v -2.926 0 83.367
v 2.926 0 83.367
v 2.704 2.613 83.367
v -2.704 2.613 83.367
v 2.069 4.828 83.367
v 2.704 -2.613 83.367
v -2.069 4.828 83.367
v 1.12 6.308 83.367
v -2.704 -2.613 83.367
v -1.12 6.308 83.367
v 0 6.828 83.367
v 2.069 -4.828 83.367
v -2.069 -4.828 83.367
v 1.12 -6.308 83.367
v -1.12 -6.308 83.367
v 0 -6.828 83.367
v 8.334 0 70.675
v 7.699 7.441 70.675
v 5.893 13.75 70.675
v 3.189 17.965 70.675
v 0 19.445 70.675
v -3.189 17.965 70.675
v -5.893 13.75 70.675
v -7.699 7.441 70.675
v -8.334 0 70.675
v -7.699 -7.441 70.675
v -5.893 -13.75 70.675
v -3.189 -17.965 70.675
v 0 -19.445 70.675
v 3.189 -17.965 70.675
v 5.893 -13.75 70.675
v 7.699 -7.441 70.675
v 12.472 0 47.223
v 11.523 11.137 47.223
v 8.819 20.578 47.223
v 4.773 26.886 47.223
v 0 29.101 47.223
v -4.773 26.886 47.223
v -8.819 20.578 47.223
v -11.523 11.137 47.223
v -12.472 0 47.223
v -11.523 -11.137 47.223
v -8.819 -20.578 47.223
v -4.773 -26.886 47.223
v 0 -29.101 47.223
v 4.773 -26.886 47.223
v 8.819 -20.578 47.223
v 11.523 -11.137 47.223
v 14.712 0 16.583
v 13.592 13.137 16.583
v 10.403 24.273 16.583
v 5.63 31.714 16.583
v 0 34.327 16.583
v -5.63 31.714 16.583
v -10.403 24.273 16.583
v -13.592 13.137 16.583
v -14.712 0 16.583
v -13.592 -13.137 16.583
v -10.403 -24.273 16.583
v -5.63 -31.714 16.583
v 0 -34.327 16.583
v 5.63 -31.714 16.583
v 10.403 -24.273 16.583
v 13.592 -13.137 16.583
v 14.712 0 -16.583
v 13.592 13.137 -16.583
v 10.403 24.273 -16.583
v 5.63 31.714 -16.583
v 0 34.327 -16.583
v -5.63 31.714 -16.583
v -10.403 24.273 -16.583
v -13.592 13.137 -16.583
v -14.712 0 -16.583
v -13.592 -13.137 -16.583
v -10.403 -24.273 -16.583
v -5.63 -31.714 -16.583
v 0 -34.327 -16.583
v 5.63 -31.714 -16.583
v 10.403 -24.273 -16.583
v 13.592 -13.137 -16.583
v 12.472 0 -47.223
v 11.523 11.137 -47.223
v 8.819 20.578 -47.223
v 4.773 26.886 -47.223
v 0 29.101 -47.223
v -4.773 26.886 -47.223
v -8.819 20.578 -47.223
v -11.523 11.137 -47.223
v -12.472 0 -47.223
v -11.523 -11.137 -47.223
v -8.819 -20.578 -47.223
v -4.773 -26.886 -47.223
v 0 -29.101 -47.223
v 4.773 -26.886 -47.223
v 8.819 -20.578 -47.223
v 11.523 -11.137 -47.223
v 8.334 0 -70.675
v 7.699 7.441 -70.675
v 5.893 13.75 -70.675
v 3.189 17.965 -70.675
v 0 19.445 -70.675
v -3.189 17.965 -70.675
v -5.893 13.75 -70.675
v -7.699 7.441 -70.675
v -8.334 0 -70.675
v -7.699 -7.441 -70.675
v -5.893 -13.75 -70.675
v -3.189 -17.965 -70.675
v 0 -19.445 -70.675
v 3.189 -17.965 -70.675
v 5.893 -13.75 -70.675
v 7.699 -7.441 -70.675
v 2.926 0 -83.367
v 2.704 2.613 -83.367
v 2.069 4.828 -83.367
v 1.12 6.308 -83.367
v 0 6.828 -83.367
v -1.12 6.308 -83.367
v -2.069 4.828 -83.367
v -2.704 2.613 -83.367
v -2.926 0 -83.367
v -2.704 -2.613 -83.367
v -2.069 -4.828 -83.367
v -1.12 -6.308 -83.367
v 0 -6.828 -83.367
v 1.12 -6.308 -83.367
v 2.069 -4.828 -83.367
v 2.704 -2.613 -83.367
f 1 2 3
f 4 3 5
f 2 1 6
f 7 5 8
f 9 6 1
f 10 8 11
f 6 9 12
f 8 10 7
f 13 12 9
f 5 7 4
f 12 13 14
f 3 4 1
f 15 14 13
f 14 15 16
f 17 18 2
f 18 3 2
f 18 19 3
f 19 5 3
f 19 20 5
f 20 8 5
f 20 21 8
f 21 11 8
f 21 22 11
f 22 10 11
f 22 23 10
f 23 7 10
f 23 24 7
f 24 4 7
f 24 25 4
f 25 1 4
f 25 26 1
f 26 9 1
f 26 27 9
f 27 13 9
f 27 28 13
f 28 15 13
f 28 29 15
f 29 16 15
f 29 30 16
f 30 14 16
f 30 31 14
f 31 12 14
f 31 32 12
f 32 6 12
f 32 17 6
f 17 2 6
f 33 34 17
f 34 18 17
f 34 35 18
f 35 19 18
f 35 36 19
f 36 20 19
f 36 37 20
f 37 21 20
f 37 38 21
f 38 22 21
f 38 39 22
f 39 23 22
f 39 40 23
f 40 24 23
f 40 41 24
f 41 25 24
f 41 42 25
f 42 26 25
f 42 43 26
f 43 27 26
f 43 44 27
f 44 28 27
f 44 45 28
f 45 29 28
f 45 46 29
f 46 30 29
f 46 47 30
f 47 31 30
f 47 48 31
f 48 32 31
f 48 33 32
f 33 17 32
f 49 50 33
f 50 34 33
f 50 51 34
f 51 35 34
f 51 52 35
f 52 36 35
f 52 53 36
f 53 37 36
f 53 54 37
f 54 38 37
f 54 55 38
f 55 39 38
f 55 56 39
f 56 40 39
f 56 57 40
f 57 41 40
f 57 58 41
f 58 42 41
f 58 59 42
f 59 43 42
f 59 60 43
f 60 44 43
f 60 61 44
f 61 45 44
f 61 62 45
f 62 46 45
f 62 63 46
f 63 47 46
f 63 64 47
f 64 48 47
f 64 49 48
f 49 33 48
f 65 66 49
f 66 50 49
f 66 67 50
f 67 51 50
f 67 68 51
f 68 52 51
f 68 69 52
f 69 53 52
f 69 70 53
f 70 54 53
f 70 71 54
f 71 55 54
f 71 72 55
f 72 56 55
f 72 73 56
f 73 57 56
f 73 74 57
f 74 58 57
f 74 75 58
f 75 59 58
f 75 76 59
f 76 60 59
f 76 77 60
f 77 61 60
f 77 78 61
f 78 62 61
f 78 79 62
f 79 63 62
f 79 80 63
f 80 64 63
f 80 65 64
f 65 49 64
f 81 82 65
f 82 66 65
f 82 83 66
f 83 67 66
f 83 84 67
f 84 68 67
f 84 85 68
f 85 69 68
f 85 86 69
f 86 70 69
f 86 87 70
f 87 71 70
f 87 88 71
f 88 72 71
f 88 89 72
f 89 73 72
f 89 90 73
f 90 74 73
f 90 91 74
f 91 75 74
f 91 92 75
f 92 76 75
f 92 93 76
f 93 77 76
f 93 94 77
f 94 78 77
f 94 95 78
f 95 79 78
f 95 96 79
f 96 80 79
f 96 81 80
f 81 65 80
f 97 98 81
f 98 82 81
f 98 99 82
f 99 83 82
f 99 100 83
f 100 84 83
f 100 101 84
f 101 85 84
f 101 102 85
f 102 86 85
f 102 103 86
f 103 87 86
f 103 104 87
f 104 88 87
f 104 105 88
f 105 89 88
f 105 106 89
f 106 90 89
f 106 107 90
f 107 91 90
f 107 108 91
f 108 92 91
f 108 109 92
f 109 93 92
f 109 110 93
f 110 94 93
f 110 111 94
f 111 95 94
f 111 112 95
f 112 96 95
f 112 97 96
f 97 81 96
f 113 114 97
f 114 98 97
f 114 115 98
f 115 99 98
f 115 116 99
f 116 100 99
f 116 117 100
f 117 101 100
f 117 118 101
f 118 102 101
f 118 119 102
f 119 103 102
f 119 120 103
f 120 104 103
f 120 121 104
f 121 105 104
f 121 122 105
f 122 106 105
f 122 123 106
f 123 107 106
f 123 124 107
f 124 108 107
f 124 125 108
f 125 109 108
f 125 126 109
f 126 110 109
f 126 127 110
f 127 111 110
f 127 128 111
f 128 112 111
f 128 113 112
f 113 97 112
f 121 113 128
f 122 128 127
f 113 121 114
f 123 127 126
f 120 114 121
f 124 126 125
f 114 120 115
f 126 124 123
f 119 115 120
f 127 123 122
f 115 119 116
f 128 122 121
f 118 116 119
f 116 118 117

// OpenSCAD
// Generated by SolidPython 1.0.1 on 2020-07-29 00:46:45


scale(v = [3, 7, 17]) {
	sphere(r = 5);
}
/***********************************************
*********      SolidPython code:      **********
************************************************
 
# import packages: SolidPython
from solid import *
from solid.utils import *
from itertools import chain, combinations, permutations


class Resize:

    def __init__(self, scad_file):
        self.scad_file = scad_file
        #self.scad_file = import_scad(scad_file)
        # cone/cylinder param:
        self.r1 = 0
        self.r2 = 0
        self.h = 0
        # rectangular prism param:
        self.w = 0
        self.l = 0
        # ellipse param:
        self.r = 0

    # import OpenScad code (file name corresponds to shape)


    # classify shape + parameters
    def assign(self, param1, param2, param3):
        if self.scad_file == 'cone.scad':
            self.r1 = param1
            self.r2 = param2
            self.h = param3
        elif self.scad_file == 'cylinder.scad':
            self.r1 = param1
            self.r2 = param2
            self.h = param3
        elif self.scad_file == 'rectangularPrism.scad':
            self.h = param1
            self.l = param2
            self.w = param3
        else:
            self.r = param1
            self.h = param2

    # resize parameters
    def iterate(self):
        x = range(3, 20, 2)
        i = 1
        if self.scad_file == 'cone.scad':
            tempList = list(permutations(x, 2))
            for temp in tempList:
                param1 = temp[0]
                param2 = temp[1]
                filepath = 'produced_scad_files/' + 'cone' + str(param1) + '_' + str(param2) + '_' + '.scad'
                scad_render_to_file(cylinder(h=param1, r1=param2, r2=0), filepath)

        elif self.scad_file == 'cylinder.scad':
            tempList = list(permutations(x, 3))
            for temp in tempList:
                param1 = temp[0]
                param2 = temp[1]
                filepath = 'produced_scad_files/' + 'cylinder' + str(param1) + '_' + str(param2) + '_' + '.scad'
                scad_render_to_file(cylinder(h=param1, r1=param2, r2=param2), filepath)

        elif self.scad_file == 'rectangularPrism.scad':
            tempList = list(permutations(x, 3))
            for temp in tempList:
                param1 = temp[0]
                param2 = temp[1]
                param3 = temp[2]
                filepath = 'produced_scad_files/' + 'rectangularPrism' + str(param1) + '_' + str(param2) + '_' + str(
                    param3) + '.scad'
                scad_render_to_file(cube(size=(param1, param2, param3)), filepath)

        elif self.scad_file == 'ellipse.scad':
            tempList = list(permutations(x, 4))
            for temp in tempList:
                param1 = temp[0]
                param2 = temp[1]
                param3 = temp[2]
                param4 = temp[3]
                filepath = 'produced_scad_files/' + 'ellipse' + str(param1) + '_' + str(param2) + '_' + str(param3) + '_' + str(param4) + '.scad'
                scad_render_to_file(scale([param1, param2, param3])(sphere(r=param4)), filepath)

    def render_to_scadfile(self):
        scad_render_to_file(scad, 'example.scad') 
 
************************************************/
